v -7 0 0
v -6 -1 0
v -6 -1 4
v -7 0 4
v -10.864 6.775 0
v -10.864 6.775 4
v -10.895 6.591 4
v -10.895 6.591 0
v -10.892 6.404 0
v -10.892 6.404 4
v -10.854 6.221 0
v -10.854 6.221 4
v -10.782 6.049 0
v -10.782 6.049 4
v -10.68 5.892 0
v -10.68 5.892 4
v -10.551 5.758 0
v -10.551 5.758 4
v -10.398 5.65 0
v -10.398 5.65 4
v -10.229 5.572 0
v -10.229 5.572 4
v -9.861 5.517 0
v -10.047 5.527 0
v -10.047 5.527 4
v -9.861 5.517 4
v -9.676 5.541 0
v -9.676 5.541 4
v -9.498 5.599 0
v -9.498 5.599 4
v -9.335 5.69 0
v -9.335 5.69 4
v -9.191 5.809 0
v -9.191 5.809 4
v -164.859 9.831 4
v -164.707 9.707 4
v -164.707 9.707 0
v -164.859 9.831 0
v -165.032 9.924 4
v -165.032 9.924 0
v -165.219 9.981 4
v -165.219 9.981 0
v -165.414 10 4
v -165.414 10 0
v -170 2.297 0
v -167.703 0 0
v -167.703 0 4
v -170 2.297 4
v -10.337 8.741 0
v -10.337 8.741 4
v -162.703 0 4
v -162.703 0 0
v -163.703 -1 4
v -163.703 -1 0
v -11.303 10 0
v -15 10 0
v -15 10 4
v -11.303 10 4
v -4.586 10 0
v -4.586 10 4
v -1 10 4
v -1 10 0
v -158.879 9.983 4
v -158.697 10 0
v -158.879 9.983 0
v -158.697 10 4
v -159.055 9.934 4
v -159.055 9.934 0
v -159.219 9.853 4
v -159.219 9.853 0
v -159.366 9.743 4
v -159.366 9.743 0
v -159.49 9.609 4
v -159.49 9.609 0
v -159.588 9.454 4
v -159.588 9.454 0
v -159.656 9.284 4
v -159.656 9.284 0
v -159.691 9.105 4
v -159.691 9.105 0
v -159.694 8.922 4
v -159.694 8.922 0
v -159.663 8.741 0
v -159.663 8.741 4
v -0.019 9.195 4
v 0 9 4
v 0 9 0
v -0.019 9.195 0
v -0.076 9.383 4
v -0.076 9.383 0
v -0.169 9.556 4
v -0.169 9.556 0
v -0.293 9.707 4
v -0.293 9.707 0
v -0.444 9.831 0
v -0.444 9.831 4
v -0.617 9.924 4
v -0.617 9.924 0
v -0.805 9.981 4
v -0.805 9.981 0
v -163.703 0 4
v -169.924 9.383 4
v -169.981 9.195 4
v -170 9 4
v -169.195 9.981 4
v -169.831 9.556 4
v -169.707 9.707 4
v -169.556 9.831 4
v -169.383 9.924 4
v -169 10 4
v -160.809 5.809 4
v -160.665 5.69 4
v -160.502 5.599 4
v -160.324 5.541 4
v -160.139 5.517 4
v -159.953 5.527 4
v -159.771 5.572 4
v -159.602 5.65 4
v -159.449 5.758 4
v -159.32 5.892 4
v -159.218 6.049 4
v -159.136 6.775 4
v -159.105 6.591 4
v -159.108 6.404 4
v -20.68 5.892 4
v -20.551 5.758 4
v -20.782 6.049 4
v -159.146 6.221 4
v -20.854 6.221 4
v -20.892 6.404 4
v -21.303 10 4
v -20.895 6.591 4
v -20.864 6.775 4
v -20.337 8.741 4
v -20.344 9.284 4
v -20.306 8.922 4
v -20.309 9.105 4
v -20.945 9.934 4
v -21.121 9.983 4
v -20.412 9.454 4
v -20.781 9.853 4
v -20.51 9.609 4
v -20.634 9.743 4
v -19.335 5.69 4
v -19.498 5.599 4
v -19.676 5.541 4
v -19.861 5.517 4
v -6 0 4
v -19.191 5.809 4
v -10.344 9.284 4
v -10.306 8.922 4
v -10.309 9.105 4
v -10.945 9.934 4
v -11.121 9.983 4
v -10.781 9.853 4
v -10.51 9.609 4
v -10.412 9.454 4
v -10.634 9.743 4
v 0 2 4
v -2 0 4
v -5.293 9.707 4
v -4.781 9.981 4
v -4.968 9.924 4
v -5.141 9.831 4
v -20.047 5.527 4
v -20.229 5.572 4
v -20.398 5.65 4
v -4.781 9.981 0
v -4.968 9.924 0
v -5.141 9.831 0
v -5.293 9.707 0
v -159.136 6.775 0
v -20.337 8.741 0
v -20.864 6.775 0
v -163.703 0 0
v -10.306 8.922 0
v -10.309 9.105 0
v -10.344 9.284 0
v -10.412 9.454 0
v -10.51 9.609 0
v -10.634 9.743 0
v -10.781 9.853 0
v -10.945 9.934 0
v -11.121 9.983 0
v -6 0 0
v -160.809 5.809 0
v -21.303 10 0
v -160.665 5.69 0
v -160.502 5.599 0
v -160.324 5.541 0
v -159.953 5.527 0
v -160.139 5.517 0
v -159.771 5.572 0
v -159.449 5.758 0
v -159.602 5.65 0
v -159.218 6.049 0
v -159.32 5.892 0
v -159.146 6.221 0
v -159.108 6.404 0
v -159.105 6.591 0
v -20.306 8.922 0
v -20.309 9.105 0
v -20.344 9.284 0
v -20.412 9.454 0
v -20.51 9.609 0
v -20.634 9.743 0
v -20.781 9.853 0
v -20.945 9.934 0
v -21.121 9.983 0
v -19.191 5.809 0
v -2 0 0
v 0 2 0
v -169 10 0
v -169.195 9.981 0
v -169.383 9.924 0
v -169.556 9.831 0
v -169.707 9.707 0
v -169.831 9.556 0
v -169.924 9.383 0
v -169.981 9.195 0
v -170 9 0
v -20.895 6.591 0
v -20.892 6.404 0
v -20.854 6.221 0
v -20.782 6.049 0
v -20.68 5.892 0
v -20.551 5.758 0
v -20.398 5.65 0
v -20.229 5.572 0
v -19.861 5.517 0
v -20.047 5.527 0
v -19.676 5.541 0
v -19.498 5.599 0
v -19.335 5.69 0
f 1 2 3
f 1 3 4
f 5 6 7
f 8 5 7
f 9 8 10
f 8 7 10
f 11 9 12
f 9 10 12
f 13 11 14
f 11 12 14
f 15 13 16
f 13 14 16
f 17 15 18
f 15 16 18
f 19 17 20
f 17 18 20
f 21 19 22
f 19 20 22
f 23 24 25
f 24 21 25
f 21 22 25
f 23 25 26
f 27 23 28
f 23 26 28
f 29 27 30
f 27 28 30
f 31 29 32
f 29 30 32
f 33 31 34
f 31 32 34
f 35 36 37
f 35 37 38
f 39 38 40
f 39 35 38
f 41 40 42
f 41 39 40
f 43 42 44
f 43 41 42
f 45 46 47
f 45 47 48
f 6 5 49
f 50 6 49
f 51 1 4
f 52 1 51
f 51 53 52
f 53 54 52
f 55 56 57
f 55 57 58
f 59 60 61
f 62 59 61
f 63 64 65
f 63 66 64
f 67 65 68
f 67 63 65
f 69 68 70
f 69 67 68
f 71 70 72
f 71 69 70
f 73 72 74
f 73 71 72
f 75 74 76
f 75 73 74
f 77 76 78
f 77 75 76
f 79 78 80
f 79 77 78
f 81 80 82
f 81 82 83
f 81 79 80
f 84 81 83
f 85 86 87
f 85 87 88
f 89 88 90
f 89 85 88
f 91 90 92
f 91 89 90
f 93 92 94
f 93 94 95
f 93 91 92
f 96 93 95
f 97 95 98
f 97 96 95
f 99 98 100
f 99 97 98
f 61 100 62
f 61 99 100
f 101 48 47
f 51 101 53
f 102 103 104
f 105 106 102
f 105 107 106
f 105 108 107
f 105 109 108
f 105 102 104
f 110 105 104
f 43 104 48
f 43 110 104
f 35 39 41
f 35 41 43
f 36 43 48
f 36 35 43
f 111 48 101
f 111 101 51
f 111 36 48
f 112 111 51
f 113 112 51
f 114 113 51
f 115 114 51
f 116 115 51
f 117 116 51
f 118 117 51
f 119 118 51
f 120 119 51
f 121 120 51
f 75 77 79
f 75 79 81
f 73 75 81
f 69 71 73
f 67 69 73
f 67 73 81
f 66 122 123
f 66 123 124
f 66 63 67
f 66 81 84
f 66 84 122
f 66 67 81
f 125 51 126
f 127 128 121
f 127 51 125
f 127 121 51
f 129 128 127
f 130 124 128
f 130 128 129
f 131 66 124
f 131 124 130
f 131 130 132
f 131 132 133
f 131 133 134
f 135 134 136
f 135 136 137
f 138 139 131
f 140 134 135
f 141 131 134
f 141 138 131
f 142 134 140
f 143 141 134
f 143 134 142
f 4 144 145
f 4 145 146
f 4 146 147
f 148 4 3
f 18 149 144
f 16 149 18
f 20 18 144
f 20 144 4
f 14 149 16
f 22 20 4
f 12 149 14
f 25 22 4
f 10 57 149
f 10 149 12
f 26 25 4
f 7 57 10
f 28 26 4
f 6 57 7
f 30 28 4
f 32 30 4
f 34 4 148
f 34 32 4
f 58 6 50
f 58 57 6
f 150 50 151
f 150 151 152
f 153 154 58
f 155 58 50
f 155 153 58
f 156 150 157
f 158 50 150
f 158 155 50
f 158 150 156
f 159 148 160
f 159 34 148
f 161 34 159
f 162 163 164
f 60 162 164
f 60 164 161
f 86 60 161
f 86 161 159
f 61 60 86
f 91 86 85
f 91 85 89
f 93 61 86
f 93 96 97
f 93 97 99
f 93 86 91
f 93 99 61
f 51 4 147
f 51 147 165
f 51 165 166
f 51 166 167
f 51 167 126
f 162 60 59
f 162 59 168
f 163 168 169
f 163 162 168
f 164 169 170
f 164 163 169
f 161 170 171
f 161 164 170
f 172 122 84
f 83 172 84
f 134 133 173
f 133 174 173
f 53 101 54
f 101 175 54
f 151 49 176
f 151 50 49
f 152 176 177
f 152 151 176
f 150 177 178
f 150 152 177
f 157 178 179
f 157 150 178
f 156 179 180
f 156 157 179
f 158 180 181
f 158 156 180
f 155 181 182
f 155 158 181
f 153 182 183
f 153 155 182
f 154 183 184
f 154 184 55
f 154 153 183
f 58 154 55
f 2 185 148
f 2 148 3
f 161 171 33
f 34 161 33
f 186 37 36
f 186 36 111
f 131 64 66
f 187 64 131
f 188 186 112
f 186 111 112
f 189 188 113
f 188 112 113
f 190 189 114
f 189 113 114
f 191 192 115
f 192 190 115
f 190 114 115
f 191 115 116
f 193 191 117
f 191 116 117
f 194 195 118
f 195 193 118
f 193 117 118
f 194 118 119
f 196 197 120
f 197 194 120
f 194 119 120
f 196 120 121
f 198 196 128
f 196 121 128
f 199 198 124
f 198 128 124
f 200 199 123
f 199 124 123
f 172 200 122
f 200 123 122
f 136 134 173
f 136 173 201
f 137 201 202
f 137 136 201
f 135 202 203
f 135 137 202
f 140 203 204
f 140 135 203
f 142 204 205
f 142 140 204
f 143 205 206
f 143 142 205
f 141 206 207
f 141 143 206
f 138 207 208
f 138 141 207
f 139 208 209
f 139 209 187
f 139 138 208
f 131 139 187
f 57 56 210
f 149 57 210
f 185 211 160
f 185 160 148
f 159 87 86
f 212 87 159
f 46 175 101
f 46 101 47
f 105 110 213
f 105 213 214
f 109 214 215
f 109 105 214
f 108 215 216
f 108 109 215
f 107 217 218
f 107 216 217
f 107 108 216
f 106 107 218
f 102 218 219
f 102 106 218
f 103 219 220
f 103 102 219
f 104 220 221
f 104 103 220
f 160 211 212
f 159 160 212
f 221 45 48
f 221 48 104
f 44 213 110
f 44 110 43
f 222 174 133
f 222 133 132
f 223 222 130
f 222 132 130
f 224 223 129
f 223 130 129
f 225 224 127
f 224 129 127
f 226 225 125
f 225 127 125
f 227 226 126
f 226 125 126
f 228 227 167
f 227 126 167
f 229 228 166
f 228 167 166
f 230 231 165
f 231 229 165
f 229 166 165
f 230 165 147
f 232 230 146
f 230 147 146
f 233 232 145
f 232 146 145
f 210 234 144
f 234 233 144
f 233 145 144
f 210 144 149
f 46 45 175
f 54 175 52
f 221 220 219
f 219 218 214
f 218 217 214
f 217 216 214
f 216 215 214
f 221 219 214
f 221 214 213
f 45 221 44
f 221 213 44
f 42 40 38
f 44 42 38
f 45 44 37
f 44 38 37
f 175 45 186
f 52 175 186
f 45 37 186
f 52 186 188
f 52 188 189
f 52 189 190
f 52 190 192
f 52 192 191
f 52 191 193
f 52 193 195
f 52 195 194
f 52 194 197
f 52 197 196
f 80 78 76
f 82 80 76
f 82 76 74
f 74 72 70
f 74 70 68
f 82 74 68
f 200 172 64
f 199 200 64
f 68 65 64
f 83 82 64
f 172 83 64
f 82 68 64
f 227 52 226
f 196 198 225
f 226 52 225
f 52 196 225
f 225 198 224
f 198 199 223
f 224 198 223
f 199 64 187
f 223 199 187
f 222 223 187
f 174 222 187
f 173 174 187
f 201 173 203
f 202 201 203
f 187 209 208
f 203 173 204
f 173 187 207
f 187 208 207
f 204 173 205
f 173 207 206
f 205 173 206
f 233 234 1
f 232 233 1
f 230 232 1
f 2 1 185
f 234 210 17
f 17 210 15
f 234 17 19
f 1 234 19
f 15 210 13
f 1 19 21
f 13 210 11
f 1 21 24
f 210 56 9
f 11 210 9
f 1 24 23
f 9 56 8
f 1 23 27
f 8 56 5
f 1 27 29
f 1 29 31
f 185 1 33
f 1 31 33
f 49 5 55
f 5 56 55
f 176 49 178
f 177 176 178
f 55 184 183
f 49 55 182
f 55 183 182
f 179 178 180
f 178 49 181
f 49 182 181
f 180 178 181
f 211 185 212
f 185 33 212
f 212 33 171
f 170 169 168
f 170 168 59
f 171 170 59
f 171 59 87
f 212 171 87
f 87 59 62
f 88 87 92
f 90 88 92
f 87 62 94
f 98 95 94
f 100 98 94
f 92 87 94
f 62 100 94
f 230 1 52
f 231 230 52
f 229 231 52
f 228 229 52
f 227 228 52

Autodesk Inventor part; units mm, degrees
ref_plane "YZ Plane" through (0, 0, 0) normal (1, 0, 0) x (0, 1, 0)
ref_plane "XZ Plane" through (0, 0, 0) normal (0, 1, 0) x (-1, 0, 0)
ref_plane "XY Plane" through (0, 0, 0) normal (0, 0, 1) x (1, 0, 0)
sketch "Эскиз1" plane through (0, 0, 0) normal (0, 0, 1) x (1, 0, 0)
  line L0 (0, 0) -> (-170, 0)
  line L1 (-170, 0) -> (-170, 10)
  line L2 (-170, 10) -> (0, 10)
  line L3 (0, 10) -> (0, 0)
  line L4 (-156.1916, 10) -> (-150.6349, 10) construction
  line L5 (-165, 10) -> (-158.1699, 3.1699)
  line L6 (-10, 10) -> (-34.5353, 10)
  line L7 (-30, 10) -> (-25, 10)
  line L8 (-23.8869, 10) -> (-18.8869, 10)
  line L9 (-15, 10) -> (-20, 10)
  line L10 (-170, 0) -> (-169, -1)
  line L11 (-170, 0) -> (-168.5858, 0) construction
  line L12 (-169, -1) -> (-169, 0)
  line L13 (-163.7026, 0) -> (-163.7026, -1)
  line L14 (-163.7026, -1) -> (-162.7026, 0)
  line L15 (0, 0) -> (-1, -1)
  line L16 (0, 0) -> (1.4142, 0) construction
  line L17 (-1, -1) -> (-1, 0)
  line L18 (-6, 0) -> (-6, -1)
  line L19 (-6, -1) -> (-7, 0)
  line L20 (-87, 0) -> (-87, -1)
  line L21 (-87, -1) -> (-88, 0)
  line L22 (-83, 0) -> (-83, -1)
  line L23 (-83, -1) -> (-82, 0)
  line L24 (-158.1699, 3.1699) -> (-160, 10)
  line L25 (-5, 10) -> (-11.8301, 3.1699)
  line L26 (-11.8301, 3.1699) -> (-10, 10)
  line L27 (-15, 10) -> (-21.8301, 3.1699)
  line L28 (-21.8301, 3.1699) -> (-20, 10)
  line L29 (-167.7026, 0) -> (-170, 2.2974)
  line L30 (-2, 0) -> (0, 2)
  point P0 (-170, 5)
  point P1 (-85, 0)
  point P2 (-161.5849, 6.5849)
  point P3 (-5, 10)
  point P4 (-15, 10)
  point P5 (-20, 10)
  dimension "d1" = 10
  dimension "d3" = 45
  dimension "d4" = 5
  dimension "d21" = 45
  dimension "d22" = 45
  dimension "d23" = 1
  dimension "d25" = 1
  dimension "d26" = 135
  dimension "d27" = 1
  dimension "d29" = 1
  dimension "d30" = 45
  dimension "d31" = 2
  dimension "d32" = 45
  dimension "d33" = 1
  dimension "d34" = 1
  dimension "d35" = 2
  dimension "d36" = 45
  dimension "d37" = 75
  dimension "d38" = 5
  dimension "d43" = 150
  dimension "d44" = 5
  dimension "d51" = 45
  dimension "d52" = 75
  dimension "d53" = 5
  dimension "d54" = 5
  dimension "d59" = 45
  dimension "d60" = 75
  dimension "d67" = 5
  dimension "d69" = 45
  dimension "d70" = 4
  dimension "d71" = 45
  dimension "d72" = 2
  dimension "d73" = 4
extrude "Выдавливание1" add sketch "Эскиз1" along normal blind 4 contours L30 L0 L29 L1 L2 L5 L24 L28 L27 L26 L25 L3 | L18 L19 L0 | L14 L13 L0
fillet "Сопряжение2" radius 1 2 edges at (0, 10, 2) (-170, 10, 2)
fillet "Сопряжение3" radius 1 8 edges at (-21.8301, 3.1699, 2) (-11.8301, 3.1699, 2) (-10, 10, 2) (-5, 10, 2) (-20, 10, 2) (-158.1699, 3.1699, 2) (-165, 10, 2) (-160, 10, 2)
properties part number "trunk 2"
